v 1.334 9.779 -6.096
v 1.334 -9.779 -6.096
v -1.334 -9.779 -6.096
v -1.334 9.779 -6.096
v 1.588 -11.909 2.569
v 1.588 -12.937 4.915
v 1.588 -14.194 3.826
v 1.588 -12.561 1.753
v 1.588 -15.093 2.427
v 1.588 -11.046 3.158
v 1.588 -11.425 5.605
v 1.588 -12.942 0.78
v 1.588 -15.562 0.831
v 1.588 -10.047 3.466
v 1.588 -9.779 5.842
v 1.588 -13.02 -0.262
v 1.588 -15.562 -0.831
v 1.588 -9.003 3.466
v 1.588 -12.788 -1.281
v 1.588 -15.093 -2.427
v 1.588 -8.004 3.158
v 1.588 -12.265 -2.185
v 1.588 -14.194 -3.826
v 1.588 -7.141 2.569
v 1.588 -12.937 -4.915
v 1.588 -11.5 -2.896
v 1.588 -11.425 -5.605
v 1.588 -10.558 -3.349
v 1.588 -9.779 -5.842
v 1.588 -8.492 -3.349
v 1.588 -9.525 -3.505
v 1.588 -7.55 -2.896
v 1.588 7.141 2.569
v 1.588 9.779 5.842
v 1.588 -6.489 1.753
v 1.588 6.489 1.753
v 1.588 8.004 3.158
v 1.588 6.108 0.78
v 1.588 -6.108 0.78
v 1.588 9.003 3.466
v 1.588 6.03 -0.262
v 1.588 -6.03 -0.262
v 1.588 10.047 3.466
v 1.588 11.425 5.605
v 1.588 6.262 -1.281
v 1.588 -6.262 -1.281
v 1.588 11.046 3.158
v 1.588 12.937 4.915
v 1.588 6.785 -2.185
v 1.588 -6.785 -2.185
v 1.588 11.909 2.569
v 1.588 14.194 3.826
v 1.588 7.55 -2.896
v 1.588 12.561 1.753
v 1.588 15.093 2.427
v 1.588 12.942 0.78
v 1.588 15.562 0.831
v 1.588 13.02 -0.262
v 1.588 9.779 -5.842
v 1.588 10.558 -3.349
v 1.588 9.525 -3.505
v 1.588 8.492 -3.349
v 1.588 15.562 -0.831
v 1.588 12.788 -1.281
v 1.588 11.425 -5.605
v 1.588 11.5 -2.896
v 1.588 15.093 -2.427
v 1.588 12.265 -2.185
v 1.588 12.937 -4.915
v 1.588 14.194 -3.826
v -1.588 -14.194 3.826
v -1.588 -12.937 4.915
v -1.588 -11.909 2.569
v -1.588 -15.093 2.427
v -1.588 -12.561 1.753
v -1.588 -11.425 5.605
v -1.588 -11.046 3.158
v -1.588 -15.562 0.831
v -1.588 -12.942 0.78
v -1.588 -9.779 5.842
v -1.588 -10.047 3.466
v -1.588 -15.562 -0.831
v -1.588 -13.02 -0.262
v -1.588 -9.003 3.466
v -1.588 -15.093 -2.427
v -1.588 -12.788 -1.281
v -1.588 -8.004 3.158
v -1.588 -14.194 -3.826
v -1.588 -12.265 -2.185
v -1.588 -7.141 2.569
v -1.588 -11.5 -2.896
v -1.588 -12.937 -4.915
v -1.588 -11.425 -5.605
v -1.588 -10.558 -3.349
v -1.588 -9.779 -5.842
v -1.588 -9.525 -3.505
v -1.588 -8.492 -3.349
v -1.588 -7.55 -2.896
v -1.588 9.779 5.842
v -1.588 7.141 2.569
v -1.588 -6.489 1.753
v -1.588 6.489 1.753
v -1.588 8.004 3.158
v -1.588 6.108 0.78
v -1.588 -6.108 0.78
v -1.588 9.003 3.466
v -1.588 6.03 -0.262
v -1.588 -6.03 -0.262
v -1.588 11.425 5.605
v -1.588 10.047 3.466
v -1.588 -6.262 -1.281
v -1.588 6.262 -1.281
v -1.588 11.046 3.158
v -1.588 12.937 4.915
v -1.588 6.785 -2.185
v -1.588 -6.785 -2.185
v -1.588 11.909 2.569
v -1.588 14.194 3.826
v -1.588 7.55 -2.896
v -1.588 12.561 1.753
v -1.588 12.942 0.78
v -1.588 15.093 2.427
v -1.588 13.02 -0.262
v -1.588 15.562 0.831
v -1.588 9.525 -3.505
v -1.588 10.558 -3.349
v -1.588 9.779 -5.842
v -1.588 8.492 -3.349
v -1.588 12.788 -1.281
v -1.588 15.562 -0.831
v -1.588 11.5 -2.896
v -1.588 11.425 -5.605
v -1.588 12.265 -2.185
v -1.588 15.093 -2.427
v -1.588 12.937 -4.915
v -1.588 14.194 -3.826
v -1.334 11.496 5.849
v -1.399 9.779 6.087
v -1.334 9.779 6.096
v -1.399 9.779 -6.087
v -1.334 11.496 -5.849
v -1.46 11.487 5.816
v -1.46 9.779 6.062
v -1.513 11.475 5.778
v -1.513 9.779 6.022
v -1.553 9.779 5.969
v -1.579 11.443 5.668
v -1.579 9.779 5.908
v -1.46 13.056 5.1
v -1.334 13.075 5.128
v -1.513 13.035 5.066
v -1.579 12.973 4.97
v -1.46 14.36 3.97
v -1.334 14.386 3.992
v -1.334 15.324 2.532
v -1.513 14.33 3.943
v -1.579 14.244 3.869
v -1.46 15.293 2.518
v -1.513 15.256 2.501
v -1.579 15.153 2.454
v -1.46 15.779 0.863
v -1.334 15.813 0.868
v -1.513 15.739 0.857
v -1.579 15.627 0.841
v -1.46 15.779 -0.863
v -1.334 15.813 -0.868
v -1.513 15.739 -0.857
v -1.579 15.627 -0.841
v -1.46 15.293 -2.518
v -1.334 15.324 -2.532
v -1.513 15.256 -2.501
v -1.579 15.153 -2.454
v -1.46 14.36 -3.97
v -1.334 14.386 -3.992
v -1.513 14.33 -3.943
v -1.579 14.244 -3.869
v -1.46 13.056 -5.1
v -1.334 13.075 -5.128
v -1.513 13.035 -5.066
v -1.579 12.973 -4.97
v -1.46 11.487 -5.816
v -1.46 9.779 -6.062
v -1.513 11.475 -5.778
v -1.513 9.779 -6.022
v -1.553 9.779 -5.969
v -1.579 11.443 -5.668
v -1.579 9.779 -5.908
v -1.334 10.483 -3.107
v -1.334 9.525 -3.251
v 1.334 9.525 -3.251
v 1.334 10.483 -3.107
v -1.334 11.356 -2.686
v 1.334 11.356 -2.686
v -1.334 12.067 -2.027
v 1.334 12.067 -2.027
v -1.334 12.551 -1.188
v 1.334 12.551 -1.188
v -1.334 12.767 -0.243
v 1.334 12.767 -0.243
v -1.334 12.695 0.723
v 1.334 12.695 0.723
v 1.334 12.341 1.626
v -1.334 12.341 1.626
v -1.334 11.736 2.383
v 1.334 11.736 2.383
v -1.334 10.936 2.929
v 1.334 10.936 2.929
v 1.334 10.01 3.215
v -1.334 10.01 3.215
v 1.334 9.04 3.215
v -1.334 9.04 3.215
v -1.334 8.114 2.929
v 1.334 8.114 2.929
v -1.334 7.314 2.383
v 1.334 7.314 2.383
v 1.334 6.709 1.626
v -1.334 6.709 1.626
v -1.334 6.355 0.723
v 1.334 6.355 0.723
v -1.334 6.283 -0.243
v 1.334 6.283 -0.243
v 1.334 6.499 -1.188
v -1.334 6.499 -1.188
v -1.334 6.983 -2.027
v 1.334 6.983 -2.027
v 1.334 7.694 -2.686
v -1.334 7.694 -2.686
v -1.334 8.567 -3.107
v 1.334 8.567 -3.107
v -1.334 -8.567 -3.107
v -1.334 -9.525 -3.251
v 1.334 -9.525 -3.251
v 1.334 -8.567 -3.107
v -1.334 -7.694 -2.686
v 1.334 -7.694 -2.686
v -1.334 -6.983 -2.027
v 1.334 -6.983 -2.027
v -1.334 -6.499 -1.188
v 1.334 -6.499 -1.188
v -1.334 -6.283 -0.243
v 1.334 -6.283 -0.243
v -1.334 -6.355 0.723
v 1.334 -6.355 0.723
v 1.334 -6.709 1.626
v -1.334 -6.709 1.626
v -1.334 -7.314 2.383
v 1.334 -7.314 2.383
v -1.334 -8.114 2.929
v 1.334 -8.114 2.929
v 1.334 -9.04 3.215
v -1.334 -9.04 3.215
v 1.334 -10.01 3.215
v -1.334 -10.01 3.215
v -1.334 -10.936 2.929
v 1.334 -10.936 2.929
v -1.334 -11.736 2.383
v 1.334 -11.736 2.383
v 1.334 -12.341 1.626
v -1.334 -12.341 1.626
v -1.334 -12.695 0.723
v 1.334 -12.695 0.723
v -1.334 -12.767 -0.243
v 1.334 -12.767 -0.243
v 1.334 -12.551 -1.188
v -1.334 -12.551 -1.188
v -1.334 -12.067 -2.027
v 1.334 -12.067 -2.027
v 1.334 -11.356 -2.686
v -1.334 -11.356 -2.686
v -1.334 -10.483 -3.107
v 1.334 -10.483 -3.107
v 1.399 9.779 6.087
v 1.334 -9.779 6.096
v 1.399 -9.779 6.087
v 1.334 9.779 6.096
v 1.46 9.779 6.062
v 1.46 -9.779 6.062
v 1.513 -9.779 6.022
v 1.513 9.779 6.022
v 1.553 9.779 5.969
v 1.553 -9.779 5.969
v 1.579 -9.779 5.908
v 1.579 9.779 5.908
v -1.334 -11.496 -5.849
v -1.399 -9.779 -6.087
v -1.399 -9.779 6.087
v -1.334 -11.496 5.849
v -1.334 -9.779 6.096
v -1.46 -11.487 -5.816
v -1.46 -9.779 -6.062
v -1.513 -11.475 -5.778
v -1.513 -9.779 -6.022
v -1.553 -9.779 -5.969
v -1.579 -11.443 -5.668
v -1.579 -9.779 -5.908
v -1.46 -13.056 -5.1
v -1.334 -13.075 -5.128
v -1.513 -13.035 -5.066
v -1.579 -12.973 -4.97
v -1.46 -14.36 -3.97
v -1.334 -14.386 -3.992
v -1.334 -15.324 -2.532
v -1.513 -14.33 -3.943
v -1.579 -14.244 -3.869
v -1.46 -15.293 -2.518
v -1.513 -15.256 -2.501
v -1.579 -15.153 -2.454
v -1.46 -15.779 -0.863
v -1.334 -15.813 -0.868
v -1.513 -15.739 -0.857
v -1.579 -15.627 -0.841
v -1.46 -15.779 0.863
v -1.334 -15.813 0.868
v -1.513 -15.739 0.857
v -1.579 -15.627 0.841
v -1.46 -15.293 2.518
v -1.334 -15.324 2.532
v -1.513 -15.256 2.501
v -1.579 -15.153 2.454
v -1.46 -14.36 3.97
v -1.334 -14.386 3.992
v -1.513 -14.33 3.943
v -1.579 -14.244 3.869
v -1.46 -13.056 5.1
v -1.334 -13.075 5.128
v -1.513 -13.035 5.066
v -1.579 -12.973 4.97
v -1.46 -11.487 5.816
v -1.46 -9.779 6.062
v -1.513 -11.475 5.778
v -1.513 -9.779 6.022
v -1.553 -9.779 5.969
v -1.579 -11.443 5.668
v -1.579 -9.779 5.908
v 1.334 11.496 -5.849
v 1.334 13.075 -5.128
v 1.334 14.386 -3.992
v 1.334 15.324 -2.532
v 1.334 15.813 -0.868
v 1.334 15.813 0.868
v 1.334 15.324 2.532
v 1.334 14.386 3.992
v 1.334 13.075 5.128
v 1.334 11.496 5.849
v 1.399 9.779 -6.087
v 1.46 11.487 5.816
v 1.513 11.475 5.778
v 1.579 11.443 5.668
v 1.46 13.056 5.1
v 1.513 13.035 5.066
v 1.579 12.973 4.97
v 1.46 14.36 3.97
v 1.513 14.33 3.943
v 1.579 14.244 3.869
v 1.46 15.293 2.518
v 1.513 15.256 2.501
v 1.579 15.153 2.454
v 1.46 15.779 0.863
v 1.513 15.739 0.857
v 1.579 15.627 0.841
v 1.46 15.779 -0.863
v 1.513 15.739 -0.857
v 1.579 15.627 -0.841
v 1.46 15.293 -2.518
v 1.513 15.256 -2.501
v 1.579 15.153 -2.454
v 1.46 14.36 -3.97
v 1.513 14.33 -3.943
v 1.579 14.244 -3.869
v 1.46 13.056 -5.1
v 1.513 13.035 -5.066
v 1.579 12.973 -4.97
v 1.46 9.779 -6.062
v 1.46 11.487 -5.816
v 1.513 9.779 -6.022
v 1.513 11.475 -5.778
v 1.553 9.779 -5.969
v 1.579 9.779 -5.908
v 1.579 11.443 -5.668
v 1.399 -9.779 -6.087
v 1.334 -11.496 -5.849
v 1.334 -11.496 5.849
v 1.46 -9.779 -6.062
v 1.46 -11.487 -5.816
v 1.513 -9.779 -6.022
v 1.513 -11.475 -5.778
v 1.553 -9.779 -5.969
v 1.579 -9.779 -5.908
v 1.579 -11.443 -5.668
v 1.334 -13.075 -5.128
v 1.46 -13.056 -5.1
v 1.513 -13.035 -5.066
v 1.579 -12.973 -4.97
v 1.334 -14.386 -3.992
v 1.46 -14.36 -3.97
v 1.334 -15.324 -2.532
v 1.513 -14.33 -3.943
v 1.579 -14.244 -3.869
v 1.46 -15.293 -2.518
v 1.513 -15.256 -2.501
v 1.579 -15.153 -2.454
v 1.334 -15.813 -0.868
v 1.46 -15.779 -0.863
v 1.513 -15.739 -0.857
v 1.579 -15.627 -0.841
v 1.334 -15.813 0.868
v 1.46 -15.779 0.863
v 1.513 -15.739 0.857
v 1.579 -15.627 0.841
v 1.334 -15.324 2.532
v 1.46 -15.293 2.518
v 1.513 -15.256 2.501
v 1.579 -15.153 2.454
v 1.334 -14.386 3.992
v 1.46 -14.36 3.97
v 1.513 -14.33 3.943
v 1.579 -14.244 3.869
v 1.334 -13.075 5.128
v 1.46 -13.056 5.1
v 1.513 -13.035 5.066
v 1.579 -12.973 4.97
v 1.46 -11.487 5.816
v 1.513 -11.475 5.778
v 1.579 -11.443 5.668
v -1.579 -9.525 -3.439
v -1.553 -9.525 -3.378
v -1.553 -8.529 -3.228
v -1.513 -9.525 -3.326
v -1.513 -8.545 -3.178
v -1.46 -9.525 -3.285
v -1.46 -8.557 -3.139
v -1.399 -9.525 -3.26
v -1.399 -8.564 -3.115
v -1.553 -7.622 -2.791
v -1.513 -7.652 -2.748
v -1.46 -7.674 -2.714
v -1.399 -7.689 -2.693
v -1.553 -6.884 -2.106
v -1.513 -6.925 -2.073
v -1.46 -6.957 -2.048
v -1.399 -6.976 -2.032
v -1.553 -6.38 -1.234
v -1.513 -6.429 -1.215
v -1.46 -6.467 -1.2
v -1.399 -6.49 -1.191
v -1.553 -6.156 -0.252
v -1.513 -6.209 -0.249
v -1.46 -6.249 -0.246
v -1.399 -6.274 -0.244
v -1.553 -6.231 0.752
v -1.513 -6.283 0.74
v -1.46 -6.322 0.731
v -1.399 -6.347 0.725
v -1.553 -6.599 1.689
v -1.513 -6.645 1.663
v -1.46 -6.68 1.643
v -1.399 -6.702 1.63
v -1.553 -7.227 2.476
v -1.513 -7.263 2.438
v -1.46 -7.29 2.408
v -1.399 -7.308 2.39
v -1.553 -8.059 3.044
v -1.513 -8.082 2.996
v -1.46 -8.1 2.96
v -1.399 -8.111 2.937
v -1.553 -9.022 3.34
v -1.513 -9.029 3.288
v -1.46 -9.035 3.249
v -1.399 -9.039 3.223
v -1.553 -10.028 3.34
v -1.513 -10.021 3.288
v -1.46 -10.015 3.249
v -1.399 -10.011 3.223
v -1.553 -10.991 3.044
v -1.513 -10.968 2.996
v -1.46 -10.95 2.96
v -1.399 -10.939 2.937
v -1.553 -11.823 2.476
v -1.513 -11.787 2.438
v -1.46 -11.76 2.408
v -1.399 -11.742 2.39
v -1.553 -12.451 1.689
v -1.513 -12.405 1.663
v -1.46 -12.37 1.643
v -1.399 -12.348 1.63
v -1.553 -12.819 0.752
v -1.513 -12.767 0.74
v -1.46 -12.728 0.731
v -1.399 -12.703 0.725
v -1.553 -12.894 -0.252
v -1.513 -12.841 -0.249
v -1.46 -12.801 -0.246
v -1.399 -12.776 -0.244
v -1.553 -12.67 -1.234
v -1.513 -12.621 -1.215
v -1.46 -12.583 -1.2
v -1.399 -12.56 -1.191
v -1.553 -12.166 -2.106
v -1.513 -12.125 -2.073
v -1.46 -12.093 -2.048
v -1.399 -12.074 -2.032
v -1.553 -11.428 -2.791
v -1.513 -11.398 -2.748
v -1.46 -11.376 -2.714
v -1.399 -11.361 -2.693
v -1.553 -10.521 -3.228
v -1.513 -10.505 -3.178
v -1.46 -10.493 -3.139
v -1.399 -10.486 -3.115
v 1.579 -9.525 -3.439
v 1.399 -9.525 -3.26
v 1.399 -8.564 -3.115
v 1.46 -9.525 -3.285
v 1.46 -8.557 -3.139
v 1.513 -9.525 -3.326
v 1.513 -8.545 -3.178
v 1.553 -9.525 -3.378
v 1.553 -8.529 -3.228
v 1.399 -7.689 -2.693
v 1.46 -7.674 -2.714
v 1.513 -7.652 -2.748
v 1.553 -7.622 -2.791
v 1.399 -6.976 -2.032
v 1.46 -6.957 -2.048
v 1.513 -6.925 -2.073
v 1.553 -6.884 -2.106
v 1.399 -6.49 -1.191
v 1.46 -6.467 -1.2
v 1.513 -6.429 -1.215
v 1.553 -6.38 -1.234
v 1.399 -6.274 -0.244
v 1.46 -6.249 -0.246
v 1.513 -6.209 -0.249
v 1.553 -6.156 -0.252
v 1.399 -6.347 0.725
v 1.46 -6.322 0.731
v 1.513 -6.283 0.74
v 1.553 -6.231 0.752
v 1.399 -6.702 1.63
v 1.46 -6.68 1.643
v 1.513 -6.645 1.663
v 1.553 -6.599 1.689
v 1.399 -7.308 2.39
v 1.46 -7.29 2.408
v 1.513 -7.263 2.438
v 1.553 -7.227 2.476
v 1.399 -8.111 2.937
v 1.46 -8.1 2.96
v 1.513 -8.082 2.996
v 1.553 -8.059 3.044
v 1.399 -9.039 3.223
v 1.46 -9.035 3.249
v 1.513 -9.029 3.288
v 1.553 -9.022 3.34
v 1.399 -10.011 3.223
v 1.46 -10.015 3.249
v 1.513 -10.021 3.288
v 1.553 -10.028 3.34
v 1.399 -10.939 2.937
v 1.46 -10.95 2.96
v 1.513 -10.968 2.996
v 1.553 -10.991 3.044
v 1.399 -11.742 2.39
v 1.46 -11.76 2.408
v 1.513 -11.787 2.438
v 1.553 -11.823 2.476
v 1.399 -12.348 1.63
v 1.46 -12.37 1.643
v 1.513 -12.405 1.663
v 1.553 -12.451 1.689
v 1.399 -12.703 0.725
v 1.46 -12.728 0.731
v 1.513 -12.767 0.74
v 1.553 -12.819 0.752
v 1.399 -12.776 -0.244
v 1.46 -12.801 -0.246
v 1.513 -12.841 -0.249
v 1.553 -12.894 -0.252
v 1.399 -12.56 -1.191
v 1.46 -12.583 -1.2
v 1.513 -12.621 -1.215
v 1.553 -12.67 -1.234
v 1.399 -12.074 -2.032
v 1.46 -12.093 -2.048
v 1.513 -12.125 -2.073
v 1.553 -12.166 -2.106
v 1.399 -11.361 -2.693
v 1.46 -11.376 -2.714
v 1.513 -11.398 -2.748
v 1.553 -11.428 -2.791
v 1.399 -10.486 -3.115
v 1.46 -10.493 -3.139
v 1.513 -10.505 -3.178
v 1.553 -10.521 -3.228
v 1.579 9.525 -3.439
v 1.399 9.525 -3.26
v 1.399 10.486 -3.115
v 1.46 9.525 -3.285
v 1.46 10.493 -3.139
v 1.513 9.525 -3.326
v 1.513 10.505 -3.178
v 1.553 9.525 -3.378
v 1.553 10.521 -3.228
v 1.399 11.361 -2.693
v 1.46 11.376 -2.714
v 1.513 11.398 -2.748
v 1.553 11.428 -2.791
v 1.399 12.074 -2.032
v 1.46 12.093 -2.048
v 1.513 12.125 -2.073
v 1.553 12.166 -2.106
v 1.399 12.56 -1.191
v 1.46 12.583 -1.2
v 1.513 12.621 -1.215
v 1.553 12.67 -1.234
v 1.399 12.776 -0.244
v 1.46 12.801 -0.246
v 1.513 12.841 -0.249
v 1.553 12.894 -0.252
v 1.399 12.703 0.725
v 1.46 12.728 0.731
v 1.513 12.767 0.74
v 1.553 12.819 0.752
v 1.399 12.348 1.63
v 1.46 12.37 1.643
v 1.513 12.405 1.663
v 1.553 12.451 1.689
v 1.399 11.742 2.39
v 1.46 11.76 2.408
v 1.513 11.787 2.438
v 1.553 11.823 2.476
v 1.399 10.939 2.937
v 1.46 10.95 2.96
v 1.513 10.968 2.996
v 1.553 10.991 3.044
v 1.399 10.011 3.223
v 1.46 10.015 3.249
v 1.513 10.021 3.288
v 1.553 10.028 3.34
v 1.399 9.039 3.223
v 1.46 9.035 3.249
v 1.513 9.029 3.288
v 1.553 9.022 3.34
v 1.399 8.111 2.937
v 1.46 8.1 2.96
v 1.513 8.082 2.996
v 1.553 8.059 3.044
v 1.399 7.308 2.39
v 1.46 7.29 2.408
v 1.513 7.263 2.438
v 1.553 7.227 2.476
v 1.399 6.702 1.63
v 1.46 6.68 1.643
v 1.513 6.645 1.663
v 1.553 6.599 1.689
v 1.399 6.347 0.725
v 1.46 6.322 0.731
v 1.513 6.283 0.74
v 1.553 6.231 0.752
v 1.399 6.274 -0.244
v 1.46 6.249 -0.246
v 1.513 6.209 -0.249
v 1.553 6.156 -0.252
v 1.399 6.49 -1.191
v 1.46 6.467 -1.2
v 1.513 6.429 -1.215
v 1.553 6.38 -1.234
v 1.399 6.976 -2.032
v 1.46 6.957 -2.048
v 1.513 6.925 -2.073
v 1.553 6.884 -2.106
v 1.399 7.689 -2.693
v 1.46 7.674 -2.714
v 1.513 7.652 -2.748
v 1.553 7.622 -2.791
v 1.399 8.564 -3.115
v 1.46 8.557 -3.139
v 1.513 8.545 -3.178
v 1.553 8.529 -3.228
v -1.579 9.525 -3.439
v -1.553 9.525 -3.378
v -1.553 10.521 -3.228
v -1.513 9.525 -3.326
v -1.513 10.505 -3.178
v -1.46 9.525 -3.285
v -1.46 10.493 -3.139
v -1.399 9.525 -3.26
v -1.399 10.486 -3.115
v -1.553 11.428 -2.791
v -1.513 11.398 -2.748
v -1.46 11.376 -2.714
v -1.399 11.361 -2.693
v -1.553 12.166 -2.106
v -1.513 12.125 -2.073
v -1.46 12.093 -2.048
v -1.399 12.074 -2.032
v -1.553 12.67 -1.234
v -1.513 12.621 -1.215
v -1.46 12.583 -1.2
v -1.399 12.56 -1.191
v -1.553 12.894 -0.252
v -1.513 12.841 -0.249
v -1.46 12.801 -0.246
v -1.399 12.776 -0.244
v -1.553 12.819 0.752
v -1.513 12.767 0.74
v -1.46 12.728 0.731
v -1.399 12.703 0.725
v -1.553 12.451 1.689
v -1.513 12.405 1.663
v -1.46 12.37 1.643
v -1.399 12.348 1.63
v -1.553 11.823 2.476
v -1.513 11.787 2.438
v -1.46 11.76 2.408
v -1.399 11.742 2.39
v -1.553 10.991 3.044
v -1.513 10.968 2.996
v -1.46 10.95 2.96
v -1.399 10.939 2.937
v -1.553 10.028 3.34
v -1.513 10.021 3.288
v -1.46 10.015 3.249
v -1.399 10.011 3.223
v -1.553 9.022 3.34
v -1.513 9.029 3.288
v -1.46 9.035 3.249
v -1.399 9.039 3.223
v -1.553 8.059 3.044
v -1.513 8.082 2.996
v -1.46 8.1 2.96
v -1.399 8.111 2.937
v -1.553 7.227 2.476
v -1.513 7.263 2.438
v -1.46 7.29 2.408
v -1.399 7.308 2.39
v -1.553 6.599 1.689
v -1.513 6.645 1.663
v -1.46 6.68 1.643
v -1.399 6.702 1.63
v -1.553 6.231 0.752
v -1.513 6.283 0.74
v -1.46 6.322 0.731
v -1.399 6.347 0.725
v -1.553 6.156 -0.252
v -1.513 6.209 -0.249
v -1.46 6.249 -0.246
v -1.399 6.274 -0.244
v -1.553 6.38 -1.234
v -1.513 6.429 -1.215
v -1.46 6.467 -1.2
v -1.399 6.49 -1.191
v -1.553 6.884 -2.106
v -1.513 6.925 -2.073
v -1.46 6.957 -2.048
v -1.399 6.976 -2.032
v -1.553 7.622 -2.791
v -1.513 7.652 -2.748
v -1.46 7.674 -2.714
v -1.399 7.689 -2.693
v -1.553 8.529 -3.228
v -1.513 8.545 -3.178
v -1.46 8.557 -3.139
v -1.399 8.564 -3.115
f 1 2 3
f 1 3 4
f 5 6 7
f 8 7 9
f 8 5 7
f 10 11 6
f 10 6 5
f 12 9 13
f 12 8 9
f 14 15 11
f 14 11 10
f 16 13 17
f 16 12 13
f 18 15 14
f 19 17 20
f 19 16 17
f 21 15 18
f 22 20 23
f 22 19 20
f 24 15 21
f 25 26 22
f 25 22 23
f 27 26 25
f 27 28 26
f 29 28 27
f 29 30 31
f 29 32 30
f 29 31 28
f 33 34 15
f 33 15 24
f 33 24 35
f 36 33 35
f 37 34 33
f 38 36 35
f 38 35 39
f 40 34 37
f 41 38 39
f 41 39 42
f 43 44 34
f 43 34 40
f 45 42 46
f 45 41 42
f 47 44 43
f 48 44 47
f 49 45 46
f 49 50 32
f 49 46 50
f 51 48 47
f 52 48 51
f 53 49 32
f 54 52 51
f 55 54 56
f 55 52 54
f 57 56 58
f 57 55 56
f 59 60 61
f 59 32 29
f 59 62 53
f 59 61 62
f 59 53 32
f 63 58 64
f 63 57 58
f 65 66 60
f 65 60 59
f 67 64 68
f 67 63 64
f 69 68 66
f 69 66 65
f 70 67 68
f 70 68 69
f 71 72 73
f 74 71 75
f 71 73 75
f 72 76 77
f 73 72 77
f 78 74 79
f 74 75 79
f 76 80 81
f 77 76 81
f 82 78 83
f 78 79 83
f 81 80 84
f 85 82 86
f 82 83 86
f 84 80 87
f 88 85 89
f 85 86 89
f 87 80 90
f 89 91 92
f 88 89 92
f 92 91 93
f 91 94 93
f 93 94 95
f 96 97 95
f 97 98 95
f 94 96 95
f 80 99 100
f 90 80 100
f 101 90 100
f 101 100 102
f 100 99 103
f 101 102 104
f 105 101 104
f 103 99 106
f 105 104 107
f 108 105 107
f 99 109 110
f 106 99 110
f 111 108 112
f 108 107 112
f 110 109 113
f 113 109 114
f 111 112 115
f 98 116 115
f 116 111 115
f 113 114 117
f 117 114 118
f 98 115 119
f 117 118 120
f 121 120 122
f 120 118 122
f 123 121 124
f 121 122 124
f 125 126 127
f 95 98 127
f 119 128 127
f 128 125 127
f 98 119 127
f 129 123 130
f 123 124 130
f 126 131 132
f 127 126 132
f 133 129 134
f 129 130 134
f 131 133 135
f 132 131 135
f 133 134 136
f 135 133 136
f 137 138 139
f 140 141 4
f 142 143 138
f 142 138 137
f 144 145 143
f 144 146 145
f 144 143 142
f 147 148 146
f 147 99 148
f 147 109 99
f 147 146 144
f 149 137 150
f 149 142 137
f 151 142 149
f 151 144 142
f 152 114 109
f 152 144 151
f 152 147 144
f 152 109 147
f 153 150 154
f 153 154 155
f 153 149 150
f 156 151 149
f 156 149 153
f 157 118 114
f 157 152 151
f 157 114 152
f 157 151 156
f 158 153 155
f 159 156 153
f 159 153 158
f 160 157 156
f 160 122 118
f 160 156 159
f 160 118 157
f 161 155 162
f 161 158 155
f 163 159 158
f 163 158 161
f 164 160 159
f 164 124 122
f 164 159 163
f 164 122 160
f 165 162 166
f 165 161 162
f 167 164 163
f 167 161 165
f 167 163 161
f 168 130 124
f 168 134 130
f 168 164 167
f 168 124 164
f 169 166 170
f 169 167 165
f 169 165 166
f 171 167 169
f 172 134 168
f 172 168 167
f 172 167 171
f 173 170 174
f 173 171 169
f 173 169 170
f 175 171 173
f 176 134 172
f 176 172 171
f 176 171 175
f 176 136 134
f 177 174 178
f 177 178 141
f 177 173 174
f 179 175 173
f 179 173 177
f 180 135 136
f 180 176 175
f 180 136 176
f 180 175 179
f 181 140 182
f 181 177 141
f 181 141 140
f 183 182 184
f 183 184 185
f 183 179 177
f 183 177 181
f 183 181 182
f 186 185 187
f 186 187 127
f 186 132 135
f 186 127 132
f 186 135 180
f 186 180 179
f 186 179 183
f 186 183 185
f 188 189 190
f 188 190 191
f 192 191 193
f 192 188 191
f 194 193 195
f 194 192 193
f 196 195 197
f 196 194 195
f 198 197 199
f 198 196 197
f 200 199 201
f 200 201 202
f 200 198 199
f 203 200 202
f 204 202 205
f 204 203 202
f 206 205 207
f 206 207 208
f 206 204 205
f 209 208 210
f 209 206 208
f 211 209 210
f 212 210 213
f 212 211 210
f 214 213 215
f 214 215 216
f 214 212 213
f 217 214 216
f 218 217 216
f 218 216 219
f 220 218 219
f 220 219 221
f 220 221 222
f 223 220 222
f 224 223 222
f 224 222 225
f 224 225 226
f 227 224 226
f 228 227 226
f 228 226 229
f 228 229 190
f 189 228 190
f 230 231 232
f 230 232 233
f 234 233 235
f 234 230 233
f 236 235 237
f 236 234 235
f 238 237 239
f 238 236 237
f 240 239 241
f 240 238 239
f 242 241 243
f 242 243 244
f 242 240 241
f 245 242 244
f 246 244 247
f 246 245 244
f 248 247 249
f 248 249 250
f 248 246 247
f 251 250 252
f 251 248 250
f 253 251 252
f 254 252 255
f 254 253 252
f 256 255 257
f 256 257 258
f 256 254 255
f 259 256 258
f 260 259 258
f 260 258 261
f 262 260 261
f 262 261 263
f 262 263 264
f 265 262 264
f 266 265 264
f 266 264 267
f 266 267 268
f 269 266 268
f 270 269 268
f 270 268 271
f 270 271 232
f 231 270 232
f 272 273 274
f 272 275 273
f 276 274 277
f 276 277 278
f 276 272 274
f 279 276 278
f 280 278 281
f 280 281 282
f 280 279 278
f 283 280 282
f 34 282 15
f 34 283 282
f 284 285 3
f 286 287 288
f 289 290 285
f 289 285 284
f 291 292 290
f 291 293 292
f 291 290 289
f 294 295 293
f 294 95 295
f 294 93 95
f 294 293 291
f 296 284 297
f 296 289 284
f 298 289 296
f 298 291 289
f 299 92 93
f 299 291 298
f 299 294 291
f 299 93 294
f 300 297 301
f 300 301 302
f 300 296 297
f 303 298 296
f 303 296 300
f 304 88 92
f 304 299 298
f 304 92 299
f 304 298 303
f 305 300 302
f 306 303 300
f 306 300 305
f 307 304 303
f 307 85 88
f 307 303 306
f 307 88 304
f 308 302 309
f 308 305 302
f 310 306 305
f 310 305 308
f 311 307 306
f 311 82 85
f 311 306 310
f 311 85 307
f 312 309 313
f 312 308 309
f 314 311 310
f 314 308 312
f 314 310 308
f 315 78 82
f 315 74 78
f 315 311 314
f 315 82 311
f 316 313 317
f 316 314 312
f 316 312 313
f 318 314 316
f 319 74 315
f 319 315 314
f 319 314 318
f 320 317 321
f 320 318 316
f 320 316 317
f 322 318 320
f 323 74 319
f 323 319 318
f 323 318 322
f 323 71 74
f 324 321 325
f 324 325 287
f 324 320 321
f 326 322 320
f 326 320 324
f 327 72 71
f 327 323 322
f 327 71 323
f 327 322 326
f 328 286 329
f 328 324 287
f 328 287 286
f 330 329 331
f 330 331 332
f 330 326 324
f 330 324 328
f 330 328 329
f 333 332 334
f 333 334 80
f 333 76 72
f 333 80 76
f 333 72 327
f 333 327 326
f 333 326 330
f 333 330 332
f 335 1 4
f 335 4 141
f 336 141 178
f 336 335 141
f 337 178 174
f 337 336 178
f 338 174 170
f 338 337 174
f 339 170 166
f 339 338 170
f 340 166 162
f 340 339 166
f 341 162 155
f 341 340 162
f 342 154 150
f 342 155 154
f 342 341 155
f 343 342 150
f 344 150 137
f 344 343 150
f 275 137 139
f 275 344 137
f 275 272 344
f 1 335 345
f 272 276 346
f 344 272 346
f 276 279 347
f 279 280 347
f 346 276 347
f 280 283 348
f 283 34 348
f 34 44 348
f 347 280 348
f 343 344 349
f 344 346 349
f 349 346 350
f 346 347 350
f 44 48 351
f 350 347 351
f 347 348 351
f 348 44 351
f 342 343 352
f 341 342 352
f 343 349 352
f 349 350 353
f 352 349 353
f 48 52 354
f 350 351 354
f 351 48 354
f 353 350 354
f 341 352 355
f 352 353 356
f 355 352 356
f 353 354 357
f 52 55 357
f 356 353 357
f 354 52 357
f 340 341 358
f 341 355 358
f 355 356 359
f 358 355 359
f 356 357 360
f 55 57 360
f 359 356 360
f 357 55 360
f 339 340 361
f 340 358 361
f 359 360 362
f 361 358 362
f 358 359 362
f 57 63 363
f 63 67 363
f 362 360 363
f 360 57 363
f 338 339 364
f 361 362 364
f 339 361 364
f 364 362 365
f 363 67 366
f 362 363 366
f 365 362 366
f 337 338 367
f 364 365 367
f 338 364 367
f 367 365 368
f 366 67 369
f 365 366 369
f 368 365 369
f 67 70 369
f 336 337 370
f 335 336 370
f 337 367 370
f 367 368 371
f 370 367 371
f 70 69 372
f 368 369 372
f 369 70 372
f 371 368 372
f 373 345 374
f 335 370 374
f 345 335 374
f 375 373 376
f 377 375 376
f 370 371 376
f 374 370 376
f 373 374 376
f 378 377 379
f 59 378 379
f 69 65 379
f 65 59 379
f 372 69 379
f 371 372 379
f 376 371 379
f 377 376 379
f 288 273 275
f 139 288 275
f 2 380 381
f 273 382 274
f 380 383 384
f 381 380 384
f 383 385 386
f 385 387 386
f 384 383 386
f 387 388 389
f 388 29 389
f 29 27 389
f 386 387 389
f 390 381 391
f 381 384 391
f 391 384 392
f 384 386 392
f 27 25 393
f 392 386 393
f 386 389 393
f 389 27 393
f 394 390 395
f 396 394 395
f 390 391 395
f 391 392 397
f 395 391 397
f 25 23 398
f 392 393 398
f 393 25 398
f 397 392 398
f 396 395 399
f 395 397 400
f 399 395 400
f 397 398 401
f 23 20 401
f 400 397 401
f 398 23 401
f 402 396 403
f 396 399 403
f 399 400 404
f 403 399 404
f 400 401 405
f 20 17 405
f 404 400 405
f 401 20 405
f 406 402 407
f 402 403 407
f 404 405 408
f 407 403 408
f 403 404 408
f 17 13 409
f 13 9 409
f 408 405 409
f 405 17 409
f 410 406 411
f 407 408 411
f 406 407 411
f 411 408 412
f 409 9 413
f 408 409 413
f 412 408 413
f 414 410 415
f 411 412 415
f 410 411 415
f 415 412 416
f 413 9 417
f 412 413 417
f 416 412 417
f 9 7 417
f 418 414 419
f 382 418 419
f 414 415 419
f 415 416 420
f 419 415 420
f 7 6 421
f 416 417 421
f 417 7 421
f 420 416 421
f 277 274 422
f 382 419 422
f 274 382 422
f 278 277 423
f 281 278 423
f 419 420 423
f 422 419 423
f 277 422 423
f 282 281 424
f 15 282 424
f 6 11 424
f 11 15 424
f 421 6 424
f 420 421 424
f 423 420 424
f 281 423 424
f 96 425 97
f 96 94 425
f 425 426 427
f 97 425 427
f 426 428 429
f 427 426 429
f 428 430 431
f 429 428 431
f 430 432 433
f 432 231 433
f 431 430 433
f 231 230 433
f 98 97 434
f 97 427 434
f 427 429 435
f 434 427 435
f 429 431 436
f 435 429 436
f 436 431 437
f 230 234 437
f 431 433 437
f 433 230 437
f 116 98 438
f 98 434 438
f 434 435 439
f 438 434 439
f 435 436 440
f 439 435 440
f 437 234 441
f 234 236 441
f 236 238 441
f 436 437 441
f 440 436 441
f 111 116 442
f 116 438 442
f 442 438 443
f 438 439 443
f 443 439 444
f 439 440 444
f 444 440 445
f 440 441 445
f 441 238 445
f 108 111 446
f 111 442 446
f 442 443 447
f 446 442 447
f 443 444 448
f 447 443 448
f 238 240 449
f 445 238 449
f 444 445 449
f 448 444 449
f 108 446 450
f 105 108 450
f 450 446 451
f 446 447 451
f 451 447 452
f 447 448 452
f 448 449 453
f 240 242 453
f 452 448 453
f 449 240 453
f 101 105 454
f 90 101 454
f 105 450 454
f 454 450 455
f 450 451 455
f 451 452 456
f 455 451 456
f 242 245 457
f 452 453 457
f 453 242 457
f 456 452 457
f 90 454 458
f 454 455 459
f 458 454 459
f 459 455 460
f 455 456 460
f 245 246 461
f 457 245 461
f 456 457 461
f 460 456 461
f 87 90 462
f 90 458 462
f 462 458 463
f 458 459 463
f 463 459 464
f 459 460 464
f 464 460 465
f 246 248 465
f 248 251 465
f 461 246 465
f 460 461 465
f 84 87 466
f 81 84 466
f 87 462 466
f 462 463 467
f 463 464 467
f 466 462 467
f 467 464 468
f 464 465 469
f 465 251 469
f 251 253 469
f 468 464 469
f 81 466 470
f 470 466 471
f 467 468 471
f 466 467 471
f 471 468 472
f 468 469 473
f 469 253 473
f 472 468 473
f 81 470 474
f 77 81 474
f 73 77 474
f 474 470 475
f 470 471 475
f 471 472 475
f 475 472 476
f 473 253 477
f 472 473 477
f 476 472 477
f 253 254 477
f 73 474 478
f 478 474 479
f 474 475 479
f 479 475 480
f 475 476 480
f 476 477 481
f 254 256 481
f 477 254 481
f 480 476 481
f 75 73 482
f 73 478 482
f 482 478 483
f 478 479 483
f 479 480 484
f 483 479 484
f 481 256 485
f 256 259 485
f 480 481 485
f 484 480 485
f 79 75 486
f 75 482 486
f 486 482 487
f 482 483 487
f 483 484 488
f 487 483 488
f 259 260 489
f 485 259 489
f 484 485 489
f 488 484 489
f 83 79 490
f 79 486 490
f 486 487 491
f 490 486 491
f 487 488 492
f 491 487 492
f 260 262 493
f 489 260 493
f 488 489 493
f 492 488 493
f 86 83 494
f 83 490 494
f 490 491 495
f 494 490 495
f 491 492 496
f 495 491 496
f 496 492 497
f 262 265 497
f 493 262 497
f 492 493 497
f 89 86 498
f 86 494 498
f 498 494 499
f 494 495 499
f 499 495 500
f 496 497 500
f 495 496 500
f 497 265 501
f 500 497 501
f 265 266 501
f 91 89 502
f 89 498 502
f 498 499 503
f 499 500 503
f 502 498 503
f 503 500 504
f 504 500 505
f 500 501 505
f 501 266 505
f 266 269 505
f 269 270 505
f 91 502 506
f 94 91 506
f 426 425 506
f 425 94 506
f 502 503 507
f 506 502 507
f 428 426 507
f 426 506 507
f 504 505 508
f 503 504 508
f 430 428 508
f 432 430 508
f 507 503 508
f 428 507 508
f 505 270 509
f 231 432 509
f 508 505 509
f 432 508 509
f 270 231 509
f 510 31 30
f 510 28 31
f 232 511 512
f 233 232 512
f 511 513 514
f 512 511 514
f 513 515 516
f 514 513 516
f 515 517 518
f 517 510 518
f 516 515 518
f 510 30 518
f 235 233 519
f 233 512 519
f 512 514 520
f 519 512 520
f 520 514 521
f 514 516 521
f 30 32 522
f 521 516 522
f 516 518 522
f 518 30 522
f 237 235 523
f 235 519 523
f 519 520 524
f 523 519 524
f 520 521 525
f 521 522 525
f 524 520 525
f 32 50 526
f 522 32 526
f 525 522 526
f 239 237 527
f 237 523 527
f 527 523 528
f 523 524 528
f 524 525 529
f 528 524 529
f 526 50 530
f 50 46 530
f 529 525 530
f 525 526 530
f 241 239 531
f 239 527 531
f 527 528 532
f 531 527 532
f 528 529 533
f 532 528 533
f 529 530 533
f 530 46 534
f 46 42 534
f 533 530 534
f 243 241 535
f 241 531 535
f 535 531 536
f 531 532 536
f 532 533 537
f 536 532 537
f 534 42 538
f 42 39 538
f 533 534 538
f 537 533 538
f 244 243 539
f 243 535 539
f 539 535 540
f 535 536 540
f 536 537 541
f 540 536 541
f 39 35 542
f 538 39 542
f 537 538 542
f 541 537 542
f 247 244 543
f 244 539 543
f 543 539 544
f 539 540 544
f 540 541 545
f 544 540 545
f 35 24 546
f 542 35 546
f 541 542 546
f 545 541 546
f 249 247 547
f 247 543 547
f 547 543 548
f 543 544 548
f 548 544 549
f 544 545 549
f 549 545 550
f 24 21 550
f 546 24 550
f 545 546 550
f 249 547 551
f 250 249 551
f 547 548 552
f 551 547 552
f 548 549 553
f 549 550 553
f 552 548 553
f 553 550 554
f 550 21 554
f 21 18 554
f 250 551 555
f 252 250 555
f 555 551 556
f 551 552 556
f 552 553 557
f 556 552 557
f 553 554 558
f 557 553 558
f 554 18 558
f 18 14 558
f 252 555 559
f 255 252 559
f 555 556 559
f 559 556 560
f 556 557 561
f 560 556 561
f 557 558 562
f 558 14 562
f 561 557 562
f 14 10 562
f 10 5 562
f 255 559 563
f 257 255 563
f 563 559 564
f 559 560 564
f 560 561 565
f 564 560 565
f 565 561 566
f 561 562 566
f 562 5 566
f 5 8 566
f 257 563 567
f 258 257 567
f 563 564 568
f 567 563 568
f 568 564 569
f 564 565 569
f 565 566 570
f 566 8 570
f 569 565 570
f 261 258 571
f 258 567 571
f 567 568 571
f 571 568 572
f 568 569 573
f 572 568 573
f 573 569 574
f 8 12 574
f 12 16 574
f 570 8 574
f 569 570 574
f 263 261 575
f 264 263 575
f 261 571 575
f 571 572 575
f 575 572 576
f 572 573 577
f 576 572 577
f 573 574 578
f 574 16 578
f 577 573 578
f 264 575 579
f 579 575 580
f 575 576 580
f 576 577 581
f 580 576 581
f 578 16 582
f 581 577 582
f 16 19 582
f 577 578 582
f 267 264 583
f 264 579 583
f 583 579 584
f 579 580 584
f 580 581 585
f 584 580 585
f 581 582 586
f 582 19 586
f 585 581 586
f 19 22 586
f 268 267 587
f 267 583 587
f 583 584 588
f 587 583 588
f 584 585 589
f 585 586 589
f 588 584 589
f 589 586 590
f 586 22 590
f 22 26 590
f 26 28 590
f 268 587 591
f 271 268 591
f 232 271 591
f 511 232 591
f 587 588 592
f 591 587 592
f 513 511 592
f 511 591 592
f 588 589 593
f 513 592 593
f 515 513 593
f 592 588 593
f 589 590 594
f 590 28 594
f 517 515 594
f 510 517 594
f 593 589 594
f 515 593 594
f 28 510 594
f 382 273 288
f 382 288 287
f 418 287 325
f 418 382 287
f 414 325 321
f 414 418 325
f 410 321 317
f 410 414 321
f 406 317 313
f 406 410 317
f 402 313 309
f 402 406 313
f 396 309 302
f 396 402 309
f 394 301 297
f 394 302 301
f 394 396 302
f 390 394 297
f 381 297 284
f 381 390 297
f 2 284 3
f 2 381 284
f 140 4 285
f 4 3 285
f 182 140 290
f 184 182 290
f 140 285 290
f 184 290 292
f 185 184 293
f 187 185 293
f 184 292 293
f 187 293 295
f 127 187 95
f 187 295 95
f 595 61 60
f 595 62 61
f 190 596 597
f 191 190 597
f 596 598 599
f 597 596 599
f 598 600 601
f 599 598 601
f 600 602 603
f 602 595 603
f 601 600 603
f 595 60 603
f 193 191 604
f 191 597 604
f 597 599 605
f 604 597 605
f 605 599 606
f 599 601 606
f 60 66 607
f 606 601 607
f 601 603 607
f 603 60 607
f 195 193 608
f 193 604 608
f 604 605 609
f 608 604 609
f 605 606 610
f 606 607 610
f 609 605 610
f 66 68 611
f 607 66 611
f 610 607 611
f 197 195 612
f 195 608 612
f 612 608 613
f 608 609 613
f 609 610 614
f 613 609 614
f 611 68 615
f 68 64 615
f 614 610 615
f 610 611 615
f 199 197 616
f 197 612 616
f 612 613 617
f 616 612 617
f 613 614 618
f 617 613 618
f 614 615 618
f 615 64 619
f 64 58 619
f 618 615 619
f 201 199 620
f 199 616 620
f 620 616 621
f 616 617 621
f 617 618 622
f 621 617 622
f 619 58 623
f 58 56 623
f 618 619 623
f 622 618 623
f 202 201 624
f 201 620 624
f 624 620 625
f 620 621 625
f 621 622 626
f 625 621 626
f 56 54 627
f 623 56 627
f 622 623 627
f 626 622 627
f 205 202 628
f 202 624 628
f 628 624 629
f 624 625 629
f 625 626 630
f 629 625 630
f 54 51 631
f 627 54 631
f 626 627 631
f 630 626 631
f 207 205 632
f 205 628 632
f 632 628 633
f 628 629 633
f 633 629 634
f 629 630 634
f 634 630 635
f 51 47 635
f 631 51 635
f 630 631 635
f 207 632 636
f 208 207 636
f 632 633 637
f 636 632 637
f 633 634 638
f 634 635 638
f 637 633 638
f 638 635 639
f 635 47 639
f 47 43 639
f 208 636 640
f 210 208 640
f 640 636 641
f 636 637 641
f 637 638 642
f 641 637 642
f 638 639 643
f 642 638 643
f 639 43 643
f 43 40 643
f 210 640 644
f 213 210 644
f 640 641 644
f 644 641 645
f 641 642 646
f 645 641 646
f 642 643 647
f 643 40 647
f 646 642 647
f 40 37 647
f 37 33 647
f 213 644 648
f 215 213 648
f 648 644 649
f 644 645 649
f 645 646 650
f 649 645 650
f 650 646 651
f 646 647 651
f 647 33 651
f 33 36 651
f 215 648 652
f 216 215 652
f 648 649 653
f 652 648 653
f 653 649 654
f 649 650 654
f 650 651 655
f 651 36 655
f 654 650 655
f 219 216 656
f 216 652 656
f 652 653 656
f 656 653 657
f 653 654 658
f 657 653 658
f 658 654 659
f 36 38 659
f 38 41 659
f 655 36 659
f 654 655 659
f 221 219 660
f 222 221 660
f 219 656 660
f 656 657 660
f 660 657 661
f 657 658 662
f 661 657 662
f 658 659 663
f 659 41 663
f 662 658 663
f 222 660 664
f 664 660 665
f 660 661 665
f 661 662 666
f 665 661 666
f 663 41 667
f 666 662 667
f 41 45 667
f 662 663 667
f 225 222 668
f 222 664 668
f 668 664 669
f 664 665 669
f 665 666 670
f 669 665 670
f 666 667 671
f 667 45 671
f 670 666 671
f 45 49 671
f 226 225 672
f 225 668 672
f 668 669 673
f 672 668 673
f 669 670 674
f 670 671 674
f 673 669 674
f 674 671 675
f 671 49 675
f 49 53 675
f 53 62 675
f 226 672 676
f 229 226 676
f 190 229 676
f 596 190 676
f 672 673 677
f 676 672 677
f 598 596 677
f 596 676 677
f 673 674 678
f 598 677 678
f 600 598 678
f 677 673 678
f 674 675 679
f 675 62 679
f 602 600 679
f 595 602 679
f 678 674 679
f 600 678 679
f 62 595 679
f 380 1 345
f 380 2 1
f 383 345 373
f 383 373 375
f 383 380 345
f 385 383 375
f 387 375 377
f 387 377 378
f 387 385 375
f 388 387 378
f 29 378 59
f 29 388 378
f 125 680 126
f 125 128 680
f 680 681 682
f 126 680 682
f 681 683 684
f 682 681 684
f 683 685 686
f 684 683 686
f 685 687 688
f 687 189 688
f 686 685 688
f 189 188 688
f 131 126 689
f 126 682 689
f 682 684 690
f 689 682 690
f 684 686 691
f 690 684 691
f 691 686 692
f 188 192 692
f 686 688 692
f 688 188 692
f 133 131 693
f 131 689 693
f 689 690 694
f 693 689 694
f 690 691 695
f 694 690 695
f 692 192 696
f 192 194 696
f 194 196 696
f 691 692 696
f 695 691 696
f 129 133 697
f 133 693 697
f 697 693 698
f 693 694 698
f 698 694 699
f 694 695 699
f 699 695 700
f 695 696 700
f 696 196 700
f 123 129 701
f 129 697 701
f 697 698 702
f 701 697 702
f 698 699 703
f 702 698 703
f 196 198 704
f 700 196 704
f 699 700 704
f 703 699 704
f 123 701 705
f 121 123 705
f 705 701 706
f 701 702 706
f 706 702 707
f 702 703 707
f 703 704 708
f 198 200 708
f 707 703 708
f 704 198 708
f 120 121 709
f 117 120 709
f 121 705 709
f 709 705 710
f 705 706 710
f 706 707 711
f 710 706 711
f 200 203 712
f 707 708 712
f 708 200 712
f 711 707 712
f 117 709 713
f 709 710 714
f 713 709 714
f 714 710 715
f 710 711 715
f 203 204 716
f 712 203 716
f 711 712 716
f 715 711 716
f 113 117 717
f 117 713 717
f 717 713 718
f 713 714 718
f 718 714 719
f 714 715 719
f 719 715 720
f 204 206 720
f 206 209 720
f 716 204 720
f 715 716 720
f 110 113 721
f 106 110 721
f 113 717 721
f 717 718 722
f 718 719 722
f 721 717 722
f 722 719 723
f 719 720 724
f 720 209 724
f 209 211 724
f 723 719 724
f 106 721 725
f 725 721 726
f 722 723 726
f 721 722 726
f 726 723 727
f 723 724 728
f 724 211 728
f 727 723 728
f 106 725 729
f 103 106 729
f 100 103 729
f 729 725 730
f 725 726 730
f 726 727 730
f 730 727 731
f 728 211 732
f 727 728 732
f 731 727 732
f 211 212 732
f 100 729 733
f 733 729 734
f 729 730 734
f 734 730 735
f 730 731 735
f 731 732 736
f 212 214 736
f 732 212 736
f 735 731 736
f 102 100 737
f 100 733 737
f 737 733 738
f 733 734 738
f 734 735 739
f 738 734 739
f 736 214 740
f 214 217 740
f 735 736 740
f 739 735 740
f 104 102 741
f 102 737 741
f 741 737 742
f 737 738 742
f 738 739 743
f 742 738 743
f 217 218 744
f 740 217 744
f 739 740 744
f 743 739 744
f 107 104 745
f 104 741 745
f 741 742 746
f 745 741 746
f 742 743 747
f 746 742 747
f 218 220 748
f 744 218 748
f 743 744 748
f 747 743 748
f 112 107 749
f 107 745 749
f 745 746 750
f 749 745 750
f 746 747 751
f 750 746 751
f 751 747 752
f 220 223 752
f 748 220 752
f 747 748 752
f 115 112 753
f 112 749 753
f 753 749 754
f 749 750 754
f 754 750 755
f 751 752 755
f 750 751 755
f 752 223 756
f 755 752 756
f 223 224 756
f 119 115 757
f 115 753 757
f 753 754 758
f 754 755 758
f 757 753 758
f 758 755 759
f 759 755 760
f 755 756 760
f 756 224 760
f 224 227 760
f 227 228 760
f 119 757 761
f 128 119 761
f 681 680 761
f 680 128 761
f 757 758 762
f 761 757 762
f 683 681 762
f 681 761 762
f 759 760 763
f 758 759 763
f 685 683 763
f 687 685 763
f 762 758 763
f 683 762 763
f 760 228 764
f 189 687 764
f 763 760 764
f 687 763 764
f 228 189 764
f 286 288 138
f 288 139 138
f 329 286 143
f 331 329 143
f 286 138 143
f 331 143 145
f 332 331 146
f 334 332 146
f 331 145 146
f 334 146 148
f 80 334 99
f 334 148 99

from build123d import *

# Parameters (mm, degrees)
SKETCH1_W           = 12.192
SKETCH1_H           = 31.75
SKETCH1_R           = 3.2512
BOSS_EXTRUDE1_DEPTH = 1.5875
FILLET1_RADIUS      = 6.096
FILLET1_LENGTH      = 3.175
FILLET2_RADIUS      = 6.096
FILLET2_LENGTH      = 3.175
FILLET3_R           = 0.254


with BuildPart() as part:
    # Sketch1 → Boss-Extrude1 (new, symmetric)
    with BuildSketch(Plane(origin=(0, 0, 0), x_dir=(0, 0, -1), z_dir=(1, 0, 0))):
        Rectangle(SKETCH1_W, SKETCH1_H)
        with Locations((0, 9.525)):
            Circle(SKETCH1_R, mode=Mode.SUBTRACT)
        with Locations((0, -9.525)):
            Circle(SKETCH1_R, mode=Mode.SUBTRACT)
    extrude(amount=BOSS_EXTRUDE1_DEPTH, both=True)

    # Fillet1: full round fillet: the end face becomes a half cylinder, R = half its width
    fillet1_face = Plane((0, 15.875, 0), x_dir=(1, 0, 0), z_dir=(0, 1, 0))  # on the end face: x along it, z out of the body
    fillet1_slab = fillet1_face.offset(-FILLET1_RADIUS / 2) * Box(FILLET1_LENGTH, 2 * FILLET1_RADIUS, FILLET1_RADIUS, mode=Mode.PRIVATE)  # the body's end, R deep
    fillet1_round = Plane((0, 9.779, 0), x_dir=(0, 1, 0), z_dir=(1, 0, 0)) * Cylinder(FILLET1_RADIUS, FILLET1_LENGTH, mode=Mode.PRIVATE)  # its axis R under the face
    add(fillet1_slab - fillet1_round, mode=Mode.SUBTRACT)

    # Fillet2: full round fillet: the end face becomes a half cylinder, R = half its width
    fillet2_face = Plane((0, -15.875, 0), x_dir=(1, 0, 0), z_dir=(0, -1, 0))  # on the end face: x along it, z out of the body
    fillet2_slab = fillet2_face.offset(-FILLET2_RADIUS / 2) * Box(FILLET2_LENGTH, 2 * FILLET2_RADIUS, FILLET2_RADIUS, mode=Mode.PRIVATE)  # the body's end, R deep
    fillet2_round = Plane((0, -9.779, 0), x_dir=(0, -1, 0), z_dir=(1, 0, 0)) * Cylinder(FILLET2_RADIUS, FILLET2_LENGTH, mode=Mode.PRIVATE)  # its axis R under the face
    add(fillet2_slab - fillet2_round, mode=Mode.SUBTRACT)

    # Fillet3
    fillet3_edges = [part.edges().sort_by_distance(p)[0] for p in [
        (-1.5875, 9.525, 3.2512),
        (1.5875, 9.525, 3.2512),
        (-1.5875, -9.525, 3.2512),
        (1.5875, -9.525, 3.2512),
        (-1.5875, 0, 6.096),
        (1.5875, 0, 6.096),
        (1.5875, 15.875, 0),
        (-1.5875, 15.875, 0),
        (-1.5875, 0, -6.096),
        (1.5875, 0, -6.096),
        (-1.5875, -15.875, 0),
        (1.5875, -15.875, 0),
    ]]
    fillet(fillet3_edges, radius=FILLET3_R)


solid = part.part
